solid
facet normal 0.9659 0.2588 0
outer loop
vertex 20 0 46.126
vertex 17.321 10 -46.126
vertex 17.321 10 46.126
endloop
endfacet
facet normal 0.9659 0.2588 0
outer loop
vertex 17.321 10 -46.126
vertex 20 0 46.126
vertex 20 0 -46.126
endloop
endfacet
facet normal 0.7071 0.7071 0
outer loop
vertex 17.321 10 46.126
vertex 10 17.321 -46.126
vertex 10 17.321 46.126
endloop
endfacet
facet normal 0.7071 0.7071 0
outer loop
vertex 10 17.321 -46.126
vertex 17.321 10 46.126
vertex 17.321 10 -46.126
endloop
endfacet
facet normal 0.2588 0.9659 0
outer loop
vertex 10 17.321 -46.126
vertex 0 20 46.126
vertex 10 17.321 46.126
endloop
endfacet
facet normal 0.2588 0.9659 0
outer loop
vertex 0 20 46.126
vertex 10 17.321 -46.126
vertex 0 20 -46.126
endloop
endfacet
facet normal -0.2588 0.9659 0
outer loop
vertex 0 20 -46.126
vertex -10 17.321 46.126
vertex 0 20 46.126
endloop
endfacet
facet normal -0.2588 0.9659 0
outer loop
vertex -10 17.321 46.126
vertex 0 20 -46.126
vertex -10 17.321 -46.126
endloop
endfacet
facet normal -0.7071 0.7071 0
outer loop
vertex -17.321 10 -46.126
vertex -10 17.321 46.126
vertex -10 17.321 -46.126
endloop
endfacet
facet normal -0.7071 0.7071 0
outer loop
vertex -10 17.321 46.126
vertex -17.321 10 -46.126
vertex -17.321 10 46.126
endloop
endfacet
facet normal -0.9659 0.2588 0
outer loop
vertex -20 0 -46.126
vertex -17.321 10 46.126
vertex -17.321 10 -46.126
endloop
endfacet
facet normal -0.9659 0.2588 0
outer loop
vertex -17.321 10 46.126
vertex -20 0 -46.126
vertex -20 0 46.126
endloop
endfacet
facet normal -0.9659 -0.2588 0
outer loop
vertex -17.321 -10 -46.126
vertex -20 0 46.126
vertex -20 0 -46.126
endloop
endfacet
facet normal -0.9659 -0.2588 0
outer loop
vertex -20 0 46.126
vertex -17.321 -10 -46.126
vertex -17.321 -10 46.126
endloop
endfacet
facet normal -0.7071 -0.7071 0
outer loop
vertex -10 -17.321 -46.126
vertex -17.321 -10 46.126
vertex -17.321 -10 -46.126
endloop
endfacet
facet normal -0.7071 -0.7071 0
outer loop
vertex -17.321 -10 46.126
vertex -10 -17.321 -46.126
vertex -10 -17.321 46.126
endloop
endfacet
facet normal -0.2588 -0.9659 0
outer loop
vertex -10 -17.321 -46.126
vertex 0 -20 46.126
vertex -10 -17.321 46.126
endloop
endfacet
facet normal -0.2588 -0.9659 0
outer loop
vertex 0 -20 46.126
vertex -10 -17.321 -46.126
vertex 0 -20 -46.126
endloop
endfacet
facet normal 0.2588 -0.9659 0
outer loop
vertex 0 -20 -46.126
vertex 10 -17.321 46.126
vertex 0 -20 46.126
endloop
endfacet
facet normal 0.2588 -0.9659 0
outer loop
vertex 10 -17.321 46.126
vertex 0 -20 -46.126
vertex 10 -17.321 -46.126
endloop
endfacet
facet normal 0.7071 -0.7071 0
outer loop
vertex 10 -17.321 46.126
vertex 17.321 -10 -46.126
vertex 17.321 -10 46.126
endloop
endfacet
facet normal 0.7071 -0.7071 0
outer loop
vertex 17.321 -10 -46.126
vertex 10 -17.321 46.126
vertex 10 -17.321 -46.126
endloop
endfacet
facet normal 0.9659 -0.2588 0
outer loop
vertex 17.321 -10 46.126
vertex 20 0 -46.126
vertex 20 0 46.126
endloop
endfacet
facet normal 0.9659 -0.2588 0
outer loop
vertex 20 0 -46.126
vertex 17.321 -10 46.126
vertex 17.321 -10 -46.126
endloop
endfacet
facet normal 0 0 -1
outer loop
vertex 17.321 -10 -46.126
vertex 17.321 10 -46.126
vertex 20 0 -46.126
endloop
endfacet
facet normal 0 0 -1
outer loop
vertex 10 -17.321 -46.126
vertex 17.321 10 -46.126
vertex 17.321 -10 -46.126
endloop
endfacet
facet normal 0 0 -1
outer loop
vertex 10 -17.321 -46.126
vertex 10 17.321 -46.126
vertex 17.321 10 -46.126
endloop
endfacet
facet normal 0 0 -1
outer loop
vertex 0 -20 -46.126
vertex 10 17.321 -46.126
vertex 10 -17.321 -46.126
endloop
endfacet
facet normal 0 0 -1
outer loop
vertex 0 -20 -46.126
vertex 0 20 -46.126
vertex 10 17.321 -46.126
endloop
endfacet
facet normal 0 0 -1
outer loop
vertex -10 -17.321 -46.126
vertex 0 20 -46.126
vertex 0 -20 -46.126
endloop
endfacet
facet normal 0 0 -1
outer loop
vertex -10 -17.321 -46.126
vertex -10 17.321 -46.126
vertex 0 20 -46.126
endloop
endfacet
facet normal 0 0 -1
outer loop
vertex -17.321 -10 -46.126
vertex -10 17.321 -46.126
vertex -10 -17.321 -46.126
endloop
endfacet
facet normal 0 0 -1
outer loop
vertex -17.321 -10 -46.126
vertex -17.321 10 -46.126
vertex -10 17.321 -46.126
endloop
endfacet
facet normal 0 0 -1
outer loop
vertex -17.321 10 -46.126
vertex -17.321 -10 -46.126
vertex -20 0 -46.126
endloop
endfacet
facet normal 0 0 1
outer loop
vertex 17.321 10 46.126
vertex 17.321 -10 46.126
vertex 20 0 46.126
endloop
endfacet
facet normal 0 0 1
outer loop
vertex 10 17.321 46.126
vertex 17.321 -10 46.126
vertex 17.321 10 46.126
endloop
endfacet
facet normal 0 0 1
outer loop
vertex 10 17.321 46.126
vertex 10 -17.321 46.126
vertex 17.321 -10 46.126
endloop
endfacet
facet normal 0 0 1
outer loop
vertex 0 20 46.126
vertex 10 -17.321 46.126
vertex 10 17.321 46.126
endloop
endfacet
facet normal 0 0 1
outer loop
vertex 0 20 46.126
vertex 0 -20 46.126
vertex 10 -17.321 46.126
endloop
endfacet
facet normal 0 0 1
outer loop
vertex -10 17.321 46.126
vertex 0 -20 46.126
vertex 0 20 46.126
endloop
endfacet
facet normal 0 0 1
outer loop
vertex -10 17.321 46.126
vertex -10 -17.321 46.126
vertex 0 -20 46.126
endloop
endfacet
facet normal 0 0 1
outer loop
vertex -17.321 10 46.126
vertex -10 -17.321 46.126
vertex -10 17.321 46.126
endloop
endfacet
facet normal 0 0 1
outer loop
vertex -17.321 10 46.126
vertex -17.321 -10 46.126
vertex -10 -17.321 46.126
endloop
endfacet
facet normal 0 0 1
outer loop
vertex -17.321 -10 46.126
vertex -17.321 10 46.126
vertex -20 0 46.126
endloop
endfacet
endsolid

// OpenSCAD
translate([0.0,0.0,0.0]){
	cylinder($fn = 12, h = 92.25225393652755, r1 = 20.0, r2 = 20.0, center = true);
}
